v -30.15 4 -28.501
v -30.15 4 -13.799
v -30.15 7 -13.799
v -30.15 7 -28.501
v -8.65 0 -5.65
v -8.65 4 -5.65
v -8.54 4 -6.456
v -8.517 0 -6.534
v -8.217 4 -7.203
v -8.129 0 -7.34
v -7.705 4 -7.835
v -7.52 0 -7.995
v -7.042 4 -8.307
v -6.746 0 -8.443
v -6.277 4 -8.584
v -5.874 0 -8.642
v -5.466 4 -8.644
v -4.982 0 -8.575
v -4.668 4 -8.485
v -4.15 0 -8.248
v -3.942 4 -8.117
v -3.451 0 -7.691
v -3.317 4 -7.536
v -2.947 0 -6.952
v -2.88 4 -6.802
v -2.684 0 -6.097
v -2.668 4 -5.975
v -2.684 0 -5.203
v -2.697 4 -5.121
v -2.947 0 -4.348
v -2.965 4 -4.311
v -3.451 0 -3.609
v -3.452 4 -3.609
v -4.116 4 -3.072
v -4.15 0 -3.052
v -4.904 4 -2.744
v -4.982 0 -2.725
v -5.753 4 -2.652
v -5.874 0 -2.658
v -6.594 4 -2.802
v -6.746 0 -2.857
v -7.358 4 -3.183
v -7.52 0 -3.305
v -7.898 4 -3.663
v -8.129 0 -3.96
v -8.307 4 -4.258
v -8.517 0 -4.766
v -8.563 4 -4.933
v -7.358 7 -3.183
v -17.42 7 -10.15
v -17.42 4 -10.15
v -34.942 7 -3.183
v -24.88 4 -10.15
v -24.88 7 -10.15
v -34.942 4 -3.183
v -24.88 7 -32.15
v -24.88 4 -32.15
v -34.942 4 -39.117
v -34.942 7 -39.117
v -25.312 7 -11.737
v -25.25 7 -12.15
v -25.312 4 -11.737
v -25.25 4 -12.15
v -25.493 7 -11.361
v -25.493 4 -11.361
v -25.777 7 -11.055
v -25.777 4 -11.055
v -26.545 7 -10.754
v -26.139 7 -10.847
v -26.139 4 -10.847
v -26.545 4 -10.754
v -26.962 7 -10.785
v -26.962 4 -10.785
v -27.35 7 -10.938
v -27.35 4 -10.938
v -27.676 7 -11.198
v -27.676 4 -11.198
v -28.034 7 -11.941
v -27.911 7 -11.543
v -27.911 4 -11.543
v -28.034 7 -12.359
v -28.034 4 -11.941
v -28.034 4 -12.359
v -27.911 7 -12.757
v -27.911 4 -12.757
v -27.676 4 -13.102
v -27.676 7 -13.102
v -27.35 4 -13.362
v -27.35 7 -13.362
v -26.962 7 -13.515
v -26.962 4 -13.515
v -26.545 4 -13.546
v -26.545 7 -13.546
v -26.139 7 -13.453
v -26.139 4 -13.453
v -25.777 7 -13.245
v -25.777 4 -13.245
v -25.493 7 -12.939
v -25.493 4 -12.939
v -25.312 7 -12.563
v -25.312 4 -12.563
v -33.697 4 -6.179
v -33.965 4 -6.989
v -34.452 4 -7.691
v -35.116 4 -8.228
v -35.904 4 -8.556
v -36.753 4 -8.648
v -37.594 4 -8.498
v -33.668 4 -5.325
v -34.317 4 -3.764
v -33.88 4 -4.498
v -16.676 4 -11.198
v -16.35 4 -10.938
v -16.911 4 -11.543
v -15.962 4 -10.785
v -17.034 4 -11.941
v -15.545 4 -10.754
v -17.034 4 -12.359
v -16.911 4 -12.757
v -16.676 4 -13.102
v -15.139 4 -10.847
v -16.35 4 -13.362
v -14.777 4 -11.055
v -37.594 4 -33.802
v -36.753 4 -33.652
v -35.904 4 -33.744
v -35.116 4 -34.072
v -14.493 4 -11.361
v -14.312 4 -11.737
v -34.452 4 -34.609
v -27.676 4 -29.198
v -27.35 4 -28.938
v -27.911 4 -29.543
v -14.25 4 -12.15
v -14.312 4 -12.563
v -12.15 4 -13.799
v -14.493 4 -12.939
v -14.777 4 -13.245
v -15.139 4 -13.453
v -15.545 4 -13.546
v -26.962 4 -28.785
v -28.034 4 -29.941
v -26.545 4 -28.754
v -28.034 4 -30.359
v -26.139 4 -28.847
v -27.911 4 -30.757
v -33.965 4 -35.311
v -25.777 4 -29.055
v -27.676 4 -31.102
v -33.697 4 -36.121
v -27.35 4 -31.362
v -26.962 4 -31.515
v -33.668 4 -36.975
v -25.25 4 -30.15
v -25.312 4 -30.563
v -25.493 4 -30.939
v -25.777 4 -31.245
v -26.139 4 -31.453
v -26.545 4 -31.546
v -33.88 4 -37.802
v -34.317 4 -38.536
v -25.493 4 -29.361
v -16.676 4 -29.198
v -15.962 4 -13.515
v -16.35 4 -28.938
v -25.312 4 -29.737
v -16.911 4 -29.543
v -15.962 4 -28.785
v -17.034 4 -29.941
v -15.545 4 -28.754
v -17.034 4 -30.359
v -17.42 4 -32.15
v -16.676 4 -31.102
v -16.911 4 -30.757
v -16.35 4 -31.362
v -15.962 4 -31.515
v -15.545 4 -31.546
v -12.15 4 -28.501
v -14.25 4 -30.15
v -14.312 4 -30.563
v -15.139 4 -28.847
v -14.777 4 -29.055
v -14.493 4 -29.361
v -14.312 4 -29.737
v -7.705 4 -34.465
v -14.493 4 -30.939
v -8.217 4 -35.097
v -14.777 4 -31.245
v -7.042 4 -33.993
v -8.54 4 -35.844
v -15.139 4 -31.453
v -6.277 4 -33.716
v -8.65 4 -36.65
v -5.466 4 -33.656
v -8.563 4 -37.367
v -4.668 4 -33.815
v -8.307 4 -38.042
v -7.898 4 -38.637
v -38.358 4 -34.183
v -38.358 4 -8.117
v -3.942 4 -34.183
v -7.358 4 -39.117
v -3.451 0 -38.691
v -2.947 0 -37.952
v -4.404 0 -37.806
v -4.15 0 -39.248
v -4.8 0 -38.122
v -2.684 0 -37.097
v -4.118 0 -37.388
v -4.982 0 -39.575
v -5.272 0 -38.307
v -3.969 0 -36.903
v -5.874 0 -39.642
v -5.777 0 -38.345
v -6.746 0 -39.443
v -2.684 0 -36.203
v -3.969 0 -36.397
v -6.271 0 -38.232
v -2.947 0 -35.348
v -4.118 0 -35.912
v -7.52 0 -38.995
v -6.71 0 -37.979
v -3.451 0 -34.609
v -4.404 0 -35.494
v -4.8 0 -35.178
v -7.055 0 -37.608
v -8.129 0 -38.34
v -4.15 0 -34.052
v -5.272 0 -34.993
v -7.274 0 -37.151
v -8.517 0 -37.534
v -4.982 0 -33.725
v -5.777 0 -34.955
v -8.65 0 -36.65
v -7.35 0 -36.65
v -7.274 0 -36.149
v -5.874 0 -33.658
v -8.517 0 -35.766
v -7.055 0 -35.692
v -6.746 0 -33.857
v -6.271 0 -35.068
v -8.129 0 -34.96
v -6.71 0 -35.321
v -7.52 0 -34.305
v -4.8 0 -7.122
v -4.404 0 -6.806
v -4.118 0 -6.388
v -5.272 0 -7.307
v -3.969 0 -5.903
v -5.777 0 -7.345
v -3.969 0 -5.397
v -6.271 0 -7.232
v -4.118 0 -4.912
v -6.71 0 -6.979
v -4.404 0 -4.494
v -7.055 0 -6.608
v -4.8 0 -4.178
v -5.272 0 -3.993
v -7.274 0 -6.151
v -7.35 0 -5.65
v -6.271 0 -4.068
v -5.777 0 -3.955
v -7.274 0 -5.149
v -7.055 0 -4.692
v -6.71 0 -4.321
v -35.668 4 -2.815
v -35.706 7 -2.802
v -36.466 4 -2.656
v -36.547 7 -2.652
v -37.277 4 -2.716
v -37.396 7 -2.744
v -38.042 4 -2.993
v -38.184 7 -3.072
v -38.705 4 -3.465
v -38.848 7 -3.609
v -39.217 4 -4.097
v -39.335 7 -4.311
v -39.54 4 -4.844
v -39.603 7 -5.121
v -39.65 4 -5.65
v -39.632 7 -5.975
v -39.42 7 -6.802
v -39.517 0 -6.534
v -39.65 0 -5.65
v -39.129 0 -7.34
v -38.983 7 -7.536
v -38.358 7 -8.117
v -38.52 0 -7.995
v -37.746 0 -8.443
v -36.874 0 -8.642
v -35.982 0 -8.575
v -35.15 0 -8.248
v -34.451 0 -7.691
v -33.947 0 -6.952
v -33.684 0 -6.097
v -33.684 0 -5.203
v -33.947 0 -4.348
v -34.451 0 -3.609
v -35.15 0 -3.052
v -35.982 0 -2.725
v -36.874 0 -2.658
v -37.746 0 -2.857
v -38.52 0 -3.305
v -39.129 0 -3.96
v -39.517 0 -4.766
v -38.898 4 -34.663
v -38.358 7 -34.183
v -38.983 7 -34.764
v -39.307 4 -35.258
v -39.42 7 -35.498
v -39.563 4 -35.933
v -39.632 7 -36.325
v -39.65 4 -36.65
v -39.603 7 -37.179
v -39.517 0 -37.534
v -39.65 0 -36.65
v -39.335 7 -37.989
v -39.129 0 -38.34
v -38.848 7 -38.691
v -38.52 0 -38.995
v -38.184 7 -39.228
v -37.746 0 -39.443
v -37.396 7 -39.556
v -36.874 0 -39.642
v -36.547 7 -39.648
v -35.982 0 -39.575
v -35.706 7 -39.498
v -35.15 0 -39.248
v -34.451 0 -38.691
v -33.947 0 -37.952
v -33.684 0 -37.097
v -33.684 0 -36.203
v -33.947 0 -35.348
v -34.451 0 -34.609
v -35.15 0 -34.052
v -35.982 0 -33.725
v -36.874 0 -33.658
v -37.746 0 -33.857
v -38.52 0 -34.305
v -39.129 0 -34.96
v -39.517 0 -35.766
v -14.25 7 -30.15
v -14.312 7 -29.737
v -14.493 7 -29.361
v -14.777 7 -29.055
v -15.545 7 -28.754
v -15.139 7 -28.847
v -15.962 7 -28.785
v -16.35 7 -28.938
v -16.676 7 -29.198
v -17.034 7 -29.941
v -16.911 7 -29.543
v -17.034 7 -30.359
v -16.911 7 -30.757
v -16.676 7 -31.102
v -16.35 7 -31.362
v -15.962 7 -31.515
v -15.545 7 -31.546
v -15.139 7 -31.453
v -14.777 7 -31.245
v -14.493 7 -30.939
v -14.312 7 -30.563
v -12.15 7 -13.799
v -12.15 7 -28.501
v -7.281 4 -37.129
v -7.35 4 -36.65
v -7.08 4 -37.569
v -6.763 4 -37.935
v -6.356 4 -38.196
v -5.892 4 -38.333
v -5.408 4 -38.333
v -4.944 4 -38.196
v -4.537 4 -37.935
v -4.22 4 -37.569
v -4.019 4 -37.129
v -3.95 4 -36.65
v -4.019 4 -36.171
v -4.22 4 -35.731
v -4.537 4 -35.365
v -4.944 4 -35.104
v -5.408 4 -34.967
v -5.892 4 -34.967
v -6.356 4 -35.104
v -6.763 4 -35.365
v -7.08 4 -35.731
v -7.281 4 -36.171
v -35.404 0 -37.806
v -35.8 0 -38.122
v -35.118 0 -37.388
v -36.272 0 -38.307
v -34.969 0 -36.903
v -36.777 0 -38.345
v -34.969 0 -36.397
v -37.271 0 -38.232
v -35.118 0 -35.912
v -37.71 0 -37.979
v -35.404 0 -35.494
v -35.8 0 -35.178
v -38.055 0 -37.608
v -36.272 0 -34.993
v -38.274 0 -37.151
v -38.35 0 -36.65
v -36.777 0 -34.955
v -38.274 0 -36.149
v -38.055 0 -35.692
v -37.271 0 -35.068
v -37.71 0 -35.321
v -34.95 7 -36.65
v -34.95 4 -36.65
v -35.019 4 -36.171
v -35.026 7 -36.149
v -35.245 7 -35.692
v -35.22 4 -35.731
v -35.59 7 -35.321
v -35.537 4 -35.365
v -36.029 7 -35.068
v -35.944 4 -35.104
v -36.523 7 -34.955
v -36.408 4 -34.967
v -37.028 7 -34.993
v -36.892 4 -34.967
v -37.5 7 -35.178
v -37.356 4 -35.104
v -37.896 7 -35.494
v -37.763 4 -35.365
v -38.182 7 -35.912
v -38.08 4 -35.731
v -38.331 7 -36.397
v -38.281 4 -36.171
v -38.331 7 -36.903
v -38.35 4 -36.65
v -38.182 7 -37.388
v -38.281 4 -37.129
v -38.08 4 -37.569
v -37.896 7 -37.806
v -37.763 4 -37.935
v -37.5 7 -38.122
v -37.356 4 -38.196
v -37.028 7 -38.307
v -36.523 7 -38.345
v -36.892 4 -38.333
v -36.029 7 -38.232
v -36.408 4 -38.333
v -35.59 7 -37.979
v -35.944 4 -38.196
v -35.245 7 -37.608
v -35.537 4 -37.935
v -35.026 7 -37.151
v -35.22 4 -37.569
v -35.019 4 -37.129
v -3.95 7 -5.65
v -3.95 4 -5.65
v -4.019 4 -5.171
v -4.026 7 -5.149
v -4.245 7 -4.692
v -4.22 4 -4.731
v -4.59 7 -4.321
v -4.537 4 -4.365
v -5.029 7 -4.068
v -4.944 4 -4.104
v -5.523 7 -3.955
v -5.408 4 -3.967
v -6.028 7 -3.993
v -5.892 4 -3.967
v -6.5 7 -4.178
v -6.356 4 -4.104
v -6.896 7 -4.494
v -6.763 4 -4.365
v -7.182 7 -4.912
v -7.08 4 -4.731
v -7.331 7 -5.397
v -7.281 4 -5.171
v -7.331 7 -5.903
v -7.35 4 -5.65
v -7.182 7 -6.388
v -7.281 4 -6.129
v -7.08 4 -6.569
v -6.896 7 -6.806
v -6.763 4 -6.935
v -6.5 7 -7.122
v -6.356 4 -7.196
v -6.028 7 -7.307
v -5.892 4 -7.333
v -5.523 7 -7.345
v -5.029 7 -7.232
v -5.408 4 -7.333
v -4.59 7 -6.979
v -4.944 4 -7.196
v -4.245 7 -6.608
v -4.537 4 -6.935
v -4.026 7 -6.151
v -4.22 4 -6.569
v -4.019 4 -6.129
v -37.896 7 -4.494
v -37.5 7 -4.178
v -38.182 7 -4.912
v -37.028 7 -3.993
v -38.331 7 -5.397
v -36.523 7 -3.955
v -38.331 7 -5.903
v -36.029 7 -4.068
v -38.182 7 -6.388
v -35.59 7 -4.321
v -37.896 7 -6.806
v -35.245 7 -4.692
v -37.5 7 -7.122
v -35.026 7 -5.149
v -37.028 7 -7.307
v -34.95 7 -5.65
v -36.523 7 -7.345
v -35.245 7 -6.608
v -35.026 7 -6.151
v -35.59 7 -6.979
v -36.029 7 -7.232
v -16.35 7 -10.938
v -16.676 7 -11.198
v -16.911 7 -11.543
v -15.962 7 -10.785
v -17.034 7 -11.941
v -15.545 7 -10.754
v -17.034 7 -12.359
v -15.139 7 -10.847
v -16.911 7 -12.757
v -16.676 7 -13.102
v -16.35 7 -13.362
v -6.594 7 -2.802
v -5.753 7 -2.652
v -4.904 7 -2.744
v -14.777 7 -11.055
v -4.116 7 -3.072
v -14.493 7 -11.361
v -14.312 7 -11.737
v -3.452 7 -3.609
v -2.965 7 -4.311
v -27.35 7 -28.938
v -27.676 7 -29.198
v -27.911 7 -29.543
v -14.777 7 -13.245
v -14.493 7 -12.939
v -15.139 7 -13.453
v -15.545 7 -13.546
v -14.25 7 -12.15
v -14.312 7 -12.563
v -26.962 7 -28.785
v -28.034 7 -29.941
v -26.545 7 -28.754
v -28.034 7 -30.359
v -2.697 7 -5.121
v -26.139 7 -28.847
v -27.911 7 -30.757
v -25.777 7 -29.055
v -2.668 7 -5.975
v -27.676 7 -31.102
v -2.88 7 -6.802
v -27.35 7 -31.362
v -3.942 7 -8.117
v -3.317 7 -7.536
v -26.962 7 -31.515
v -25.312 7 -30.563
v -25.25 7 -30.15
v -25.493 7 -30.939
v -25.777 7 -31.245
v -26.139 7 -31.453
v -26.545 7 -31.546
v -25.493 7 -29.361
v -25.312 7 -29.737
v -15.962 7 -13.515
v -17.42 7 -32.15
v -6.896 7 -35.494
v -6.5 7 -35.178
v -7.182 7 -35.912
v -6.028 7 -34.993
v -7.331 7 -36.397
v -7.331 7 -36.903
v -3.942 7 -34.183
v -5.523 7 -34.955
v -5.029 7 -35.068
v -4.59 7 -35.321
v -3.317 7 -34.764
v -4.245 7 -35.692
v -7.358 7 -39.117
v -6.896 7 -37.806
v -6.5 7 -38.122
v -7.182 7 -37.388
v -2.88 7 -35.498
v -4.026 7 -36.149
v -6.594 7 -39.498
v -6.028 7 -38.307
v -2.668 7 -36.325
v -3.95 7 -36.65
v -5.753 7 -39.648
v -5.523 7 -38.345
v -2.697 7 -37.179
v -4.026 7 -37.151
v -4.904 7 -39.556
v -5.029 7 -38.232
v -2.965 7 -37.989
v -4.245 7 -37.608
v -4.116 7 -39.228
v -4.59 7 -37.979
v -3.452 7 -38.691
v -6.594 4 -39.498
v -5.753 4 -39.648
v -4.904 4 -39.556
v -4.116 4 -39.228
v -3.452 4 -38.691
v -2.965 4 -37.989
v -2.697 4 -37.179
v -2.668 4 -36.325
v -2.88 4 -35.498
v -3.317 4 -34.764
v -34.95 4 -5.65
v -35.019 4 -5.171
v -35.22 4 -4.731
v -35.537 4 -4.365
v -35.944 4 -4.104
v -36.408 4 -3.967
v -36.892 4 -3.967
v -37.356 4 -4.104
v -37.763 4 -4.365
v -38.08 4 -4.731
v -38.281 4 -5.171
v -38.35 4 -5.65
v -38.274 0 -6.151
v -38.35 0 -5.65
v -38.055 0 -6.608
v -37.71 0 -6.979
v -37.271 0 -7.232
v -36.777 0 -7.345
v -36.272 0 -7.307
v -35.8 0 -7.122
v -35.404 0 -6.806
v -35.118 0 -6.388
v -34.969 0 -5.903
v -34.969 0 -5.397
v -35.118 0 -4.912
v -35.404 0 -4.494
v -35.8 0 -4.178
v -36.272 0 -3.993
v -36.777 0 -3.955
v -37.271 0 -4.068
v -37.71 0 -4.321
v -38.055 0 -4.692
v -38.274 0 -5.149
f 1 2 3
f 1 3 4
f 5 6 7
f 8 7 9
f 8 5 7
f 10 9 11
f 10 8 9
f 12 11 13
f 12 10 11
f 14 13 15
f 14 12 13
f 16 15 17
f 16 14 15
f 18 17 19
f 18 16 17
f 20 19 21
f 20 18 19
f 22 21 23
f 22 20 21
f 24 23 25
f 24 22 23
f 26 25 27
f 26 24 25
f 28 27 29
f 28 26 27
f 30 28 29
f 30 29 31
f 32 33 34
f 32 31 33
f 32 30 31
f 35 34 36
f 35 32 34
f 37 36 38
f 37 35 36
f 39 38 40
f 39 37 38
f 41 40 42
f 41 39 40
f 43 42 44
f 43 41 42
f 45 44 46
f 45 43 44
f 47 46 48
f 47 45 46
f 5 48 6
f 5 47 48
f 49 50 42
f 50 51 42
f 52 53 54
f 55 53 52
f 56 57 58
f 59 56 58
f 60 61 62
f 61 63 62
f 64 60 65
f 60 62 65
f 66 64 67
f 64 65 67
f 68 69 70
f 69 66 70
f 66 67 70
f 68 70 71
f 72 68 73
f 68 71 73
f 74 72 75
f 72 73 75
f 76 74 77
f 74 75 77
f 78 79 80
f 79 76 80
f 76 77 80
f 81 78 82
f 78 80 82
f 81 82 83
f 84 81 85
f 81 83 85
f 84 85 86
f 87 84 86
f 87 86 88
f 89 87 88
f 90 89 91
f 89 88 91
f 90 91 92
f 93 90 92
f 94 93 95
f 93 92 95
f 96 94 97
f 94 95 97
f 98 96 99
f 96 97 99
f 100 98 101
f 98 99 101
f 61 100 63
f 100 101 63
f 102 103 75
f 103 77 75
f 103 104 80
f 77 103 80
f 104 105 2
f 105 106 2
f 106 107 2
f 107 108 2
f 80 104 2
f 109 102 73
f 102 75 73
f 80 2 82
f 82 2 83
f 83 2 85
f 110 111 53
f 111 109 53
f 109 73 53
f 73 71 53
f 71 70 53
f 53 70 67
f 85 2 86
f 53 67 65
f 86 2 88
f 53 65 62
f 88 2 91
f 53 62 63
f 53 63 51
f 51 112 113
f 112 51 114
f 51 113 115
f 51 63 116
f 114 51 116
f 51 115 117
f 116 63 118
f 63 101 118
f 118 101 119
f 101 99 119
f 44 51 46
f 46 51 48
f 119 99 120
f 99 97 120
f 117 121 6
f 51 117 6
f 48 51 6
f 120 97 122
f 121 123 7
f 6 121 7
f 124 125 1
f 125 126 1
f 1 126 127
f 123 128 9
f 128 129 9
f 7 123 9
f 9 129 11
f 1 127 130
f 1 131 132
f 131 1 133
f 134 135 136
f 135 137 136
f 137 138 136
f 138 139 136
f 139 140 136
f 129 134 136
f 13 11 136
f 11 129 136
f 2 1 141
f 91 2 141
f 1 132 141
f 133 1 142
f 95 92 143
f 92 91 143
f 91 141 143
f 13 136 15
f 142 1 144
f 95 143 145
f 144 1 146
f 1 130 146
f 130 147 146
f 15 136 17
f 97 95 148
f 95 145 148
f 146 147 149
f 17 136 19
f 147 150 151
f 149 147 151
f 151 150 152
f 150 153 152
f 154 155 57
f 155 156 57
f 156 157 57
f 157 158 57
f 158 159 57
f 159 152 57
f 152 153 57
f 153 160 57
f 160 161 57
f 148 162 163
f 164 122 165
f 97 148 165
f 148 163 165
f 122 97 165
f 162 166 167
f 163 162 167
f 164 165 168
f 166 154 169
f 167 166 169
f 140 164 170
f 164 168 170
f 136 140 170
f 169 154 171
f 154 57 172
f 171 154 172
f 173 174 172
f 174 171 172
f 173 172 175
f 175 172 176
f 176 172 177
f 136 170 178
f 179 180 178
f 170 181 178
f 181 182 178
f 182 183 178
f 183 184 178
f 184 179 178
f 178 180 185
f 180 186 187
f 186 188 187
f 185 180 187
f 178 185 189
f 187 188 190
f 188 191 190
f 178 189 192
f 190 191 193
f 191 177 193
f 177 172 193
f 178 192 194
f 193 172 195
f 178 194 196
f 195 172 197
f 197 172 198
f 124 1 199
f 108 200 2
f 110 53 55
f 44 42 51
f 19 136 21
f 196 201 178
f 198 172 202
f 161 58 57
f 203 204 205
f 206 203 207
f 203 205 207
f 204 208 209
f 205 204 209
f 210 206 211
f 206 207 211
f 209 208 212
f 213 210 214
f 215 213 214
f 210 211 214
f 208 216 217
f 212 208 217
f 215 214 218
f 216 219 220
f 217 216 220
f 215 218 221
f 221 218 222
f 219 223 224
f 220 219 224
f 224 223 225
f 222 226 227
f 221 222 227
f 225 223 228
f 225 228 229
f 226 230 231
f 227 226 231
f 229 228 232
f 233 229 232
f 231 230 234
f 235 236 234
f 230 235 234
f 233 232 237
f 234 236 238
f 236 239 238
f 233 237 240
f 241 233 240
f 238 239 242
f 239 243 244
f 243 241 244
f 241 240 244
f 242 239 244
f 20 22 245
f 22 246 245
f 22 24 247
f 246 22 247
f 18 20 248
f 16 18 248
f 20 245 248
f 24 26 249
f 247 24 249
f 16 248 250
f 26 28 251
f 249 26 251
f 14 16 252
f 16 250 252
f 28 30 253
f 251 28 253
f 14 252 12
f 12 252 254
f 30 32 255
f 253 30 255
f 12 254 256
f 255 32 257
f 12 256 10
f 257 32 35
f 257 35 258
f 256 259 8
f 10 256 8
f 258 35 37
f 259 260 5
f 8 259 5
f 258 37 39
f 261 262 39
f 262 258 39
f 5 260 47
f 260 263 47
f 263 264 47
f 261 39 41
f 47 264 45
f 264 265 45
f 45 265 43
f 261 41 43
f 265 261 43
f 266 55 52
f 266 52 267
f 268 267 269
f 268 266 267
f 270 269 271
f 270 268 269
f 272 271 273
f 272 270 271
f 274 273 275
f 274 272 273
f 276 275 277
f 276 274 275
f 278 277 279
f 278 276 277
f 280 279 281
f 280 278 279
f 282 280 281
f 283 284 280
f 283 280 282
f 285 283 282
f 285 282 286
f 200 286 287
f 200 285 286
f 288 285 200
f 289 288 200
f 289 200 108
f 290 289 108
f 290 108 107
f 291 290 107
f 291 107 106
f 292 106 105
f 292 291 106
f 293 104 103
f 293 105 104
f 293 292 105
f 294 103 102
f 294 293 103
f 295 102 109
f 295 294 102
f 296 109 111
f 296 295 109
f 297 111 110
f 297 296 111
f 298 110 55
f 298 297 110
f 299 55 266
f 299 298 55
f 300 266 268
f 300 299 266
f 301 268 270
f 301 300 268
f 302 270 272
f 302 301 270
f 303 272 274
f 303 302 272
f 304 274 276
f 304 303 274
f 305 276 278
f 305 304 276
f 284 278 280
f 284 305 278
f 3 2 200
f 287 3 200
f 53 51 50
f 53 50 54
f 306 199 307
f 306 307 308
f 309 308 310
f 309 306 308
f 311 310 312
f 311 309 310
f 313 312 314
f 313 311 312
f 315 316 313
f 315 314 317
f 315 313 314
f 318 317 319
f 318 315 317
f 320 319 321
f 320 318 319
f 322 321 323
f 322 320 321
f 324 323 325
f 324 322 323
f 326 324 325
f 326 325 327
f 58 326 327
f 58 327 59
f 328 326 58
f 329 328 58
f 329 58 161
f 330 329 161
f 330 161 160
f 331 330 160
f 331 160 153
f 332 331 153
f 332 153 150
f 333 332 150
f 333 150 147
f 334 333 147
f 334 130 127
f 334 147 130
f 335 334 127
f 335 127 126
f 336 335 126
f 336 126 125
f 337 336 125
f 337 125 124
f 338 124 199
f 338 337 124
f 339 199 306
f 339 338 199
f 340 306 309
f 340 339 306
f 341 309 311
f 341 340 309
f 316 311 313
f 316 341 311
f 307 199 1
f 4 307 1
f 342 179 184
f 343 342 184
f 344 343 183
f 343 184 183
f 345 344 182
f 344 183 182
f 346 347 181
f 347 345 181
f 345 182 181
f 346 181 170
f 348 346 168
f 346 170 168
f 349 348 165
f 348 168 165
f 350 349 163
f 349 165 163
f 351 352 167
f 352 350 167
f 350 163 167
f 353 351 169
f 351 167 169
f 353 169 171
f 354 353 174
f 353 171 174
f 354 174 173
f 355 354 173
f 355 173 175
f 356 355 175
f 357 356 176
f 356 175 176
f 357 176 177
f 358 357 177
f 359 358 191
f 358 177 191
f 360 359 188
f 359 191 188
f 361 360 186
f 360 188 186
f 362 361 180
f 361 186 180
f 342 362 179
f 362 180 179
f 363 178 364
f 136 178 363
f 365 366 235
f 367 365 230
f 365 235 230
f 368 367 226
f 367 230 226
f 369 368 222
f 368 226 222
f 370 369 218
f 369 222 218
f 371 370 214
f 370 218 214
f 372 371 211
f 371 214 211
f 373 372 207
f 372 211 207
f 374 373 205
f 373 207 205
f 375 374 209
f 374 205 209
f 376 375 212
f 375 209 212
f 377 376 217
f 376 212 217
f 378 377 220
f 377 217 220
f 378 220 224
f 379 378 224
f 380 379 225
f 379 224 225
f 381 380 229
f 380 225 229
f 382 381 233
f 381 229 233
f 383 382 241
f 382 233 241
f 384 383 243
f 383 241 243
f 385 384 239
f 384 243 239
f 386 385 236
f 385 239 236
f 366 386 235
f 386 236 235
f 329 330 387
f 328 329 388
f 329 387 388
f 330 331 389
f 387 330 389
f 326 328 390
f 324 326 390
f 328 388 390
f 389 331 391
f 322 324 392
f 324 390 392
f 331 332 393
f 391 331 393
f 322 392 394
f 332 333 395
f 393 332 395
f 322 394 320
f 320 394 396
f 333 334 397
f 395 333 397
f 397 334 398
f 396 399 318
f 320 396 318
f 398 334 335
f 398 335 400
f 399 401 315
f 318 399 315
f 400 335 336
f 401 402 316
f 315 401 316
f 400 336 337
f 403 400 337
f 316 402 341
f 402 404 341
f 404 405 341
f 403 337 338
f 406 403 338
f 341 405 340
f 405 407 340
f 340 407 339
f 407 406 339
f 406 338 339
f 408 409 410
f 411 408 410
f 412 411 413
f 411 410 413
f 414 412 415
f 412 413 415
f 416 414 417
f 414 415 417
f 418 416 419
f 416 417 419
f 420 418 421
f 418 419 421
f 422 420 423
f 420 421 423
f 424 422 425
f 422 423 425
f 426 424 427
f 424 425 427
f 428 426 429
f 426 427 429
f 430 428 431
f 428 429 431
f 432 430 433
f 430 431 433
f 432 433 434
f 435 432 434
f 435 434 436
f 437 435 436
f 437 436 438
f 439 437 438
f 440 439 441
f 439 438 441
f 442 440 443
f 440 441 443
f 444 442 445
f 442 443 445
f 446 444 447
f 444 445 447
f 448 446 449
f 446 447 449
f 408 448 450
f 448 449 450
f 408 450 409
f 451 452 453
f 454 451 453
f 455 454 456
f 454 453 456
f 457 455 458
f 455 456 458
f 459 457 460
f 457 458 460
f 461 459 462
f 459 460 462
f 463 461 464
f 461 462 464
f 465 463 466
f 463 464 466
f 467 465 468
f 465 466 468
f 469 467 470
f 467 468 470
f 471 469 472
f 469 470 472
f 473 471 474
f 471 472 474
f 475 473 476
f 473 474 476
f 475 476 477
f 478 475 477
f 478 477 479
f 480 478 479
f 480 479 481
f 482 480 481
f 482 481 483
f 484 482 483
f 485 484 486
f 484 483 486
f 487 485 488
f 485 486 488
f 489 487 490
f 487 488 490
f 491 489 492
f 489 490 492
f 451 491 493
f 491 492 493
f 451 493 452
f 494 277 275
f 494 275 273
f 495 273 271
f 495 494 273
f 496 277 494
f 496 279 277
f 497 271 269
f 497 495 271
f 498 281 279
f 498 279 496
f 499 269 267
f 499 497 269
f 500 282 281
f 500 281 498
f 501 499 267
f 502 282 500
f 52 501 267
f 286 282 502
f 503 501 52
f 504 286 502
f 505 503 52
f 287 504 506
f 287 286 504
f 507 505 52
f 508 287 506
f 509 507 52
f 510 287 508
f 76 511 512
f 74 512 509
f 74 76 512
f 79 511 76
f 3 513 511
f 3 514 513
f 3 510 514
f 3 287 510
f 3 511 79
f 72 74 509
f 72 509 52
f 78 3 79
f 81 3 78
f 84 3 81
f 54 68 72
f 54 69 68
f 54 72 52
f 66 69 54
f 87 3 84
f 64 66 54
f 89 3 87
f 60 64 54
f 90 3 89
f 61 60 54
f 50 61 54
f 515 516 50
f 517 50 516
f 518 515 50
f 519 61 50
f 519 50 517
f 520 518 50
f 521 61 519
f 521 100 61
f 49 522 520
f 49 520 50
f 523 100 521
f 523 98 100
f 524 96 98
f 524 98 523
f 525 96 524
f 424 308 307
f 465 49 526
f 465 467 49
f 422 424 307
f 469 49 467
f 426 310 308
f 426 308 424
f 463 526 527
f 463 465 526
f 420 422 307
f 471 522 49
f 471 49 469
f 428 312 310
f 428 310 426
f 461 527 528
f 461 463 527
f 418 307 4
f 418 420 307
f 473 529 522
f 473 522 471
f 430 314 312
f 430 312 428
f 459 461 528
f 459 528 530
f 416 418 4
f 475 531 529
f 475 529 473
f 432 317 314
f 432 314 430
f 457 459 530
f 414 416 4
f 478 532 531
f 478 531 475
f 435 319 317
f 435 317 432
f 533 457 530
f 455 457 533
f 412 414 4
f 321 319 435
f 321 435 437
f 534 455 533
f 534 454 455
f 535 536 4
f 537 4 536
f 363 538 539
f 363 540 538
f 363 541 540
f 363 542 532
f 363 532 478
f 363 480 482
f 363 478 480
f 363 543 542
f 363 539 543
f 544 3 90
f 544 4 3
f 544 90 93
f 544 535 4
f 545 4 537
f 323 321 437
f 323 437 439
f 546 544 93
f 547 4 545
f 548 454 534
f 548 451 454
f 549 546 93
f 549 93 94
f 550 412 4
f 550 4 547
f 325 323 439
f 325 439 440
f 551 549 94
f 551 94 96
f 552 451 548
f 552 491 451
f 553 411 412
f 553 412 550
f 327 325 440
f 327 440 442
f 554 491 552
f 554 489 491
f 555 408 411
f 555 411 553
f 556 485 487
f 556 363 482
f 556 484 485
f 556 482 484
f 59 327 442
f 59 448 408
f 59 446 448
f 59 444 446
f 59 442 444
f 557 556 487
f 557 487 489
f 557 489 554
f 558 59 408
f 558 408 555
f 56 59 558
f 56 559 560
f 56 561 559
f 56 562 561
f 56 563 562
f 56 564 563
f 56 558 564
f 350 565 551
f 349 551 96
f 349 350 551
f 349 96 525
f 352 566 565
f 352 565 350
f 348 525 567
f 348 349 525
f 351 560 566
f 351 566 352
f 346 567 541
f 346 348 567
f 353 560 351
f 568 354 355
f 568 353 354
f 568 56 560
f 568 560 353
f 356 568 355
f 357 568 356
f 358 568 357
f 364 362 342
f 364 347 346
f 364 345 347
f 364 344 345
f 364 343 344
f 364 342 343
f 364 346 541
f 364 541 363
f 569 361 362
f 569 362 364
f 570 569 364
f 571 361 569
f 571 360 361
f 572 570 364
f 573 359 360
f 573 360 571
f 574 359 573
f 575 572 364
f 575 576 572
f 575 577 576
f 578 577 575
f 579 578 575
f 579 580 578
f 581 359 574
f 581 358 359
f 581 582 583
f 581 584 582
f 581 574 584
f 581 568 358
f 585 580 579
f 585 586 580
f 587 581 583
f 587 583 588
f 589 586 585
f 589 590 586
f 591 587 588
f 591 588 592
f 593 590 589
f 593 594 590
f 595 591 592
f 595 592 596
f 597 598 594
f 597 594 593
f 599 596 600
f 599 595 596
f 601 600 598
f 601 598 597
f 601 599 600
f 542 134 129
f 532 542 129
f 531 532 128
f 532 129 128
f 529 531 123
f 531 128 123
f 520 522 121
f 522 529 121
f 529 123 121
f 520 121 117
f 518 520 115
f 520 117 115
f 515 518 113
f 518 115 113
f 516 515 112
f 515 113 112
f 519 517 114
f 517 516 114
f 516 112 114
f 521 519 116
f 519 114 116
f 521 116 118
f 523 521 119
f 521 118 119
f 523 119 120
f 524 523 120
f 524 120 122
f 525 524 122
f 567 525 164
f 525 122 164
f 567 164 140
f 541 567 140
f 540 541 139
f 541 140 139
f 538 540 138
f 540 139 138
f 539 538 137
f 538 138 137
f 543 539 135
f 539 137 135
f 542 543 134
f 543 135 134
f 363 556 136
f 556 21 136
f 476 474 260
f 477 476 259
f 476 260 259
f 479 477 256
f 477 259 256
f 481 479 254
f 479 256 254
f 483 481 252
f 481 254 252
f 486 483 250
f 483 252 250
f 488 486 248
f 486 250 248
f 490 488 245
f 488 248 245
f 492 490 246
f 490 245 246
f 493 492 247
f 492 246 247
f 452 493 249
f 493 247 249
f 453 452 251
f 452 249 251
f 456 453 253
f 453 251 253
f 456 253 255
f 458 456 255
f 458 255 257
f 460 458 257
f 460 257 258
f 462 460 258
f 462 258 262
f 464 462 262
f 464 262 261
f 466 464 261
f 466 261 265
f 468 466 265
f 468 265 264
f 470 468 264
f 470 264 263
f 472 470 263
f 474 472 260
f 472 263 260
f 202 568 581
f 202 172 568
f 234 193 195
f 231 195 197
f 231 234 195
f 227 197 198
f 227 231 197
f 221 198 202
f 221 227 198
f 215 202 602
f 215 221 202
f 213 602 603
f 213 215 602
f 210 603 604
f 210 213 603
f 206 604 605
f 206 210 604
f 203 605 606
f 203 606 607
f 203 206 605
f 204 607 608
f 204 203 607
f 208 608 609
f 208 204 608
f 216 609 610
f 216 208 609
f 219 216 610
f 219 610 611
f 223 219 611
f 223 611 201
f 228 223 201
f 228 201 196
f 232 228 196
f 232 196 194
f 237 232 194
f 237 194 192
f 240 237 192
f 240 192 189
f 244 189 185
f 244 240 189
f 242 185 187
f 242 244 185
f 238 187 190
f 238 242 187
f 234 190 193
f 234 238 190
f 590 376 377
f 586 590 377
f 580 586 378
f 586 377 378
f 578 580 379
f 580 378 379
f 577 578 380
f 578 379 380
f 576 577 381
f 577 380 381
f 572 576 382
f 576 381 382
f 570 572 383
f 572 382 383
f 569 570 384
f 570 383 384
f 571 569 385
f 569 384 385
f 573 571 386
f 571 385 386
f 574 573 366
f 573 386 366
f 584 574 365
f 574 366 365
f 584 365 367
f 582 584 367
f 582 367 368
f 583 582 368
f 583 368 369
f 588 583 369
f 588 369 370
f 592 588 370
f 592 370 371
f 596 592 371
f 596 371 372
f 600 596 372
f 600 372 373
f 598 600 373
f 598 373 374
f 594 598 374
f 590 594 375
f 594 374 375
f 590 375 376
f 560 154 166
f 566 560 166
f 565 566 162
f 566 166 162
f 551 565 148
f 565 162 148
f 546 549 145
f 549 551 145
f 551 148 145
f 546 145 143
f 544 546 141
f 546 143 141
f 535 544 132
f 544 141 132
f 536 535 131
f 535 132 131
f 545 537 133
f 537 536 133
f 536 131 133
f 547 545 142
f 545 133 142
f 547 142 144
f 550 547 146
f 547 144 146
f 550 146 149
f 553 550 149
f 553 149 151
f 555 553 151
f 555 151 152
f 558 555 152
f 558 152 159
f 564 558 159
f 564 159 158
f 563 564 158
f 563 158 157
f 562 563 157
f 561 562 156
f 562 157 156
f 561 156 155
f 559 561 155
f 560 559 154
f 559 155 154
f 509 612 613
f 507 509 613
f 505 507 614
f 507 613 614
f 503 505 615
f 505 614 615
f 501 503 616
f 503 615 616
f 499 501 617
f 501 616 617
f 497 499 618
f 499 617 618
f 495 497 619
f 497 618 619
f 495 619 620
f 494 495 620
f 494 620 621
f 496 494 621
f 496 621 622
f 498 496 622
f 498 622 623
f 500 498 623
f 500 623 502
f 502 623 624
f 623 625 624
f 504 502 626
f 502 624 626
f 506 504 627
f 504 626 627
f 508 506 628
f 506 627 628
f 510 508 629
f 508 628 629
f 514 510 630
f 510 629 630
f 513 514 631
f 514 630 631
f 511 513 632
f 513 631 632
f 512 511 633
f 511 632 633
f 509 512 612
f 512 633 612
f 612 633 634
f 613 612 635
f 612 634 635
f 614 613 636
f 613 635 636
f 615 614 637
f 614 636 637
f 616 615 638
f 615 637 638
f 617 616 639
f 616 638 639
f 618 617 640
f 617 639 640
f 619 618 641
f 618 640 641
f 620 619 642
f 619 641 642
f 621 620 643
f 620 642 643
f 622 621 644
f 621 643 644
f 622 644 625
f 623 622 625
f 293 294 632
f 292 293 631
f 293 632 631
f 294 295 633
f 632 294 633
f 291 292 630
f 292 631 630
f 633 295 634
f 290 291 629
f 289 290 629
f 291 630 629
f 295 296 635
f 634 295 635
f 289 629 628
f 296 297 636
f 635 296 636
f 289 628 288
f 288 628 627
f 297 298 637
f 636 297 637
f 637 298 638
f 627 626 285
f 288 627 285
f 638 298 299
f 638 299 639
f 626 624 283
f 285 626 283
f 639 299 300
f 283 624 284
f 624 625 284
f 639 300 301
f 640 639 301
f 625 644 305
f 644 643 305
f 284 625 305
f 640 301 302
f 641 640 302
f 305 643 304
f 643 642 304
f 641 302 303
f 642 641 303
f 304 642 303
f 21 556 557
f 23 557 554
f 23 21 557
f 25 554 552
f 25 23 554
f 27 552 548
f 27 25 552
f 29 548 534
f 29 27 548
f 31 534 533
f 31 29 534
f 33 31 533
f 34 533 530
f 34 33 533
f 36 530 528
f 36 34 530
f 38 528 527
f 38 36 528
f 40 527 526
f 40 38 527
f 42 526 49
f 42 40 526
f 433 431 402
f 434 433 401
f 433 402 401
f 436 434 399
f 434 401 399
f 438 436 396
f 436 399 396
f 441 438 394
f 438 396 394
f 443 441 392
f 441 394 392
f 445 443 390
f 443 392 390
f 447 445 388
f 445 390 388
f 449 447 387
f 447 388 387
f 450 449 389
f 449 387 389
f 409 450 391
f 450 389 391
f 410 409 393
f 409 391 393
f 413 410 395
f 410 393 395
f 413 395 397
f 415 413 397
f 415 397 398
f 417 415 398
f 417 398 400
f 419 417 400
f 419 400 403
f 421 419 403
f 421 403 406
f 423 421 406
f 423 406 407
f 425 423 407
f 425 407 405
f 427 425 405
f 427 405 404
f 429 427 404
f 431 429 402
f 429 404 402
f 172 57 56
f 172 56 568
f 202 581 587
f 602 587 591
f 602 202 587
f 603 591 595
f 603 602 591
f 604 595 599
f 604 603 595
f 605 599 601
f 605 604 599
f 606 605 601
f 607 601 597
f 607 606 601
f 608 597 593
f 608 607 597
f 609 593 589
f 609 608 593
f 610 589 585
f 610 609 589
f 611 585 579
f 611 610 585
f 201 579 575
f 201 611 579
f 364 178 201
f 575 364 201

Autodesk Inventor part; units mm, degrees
ref_plane "YZ Plane" through (0, 0, 0) normal (1, 0, 0) x (0, 1, 0)
ref_plane "XZ Plane" through (0, 0, 0) normal (0, 1, 0) x (-1, 0, 0)
ref_plane "XY Plane" through (0, 0, 0) normal (0, 0, 1) x (1, 0, 0)
sketch "Sketch1" plane through (0, 0, 0) normal (0, 1, 0) x (-1, 0, 0)
  line L0 (0, 0) -> (42.3, 0) construction
  line L1 (42.3, 0) -> (42.3, -42.3) construction
  line L2 (42.3, -42.3) -> (0, -42.3) construction
  line L3 (0, -42.3) -> (0, 0) construction
  circle A0 centre (36.65, -5.65) radius 1.7
  circle A1 centre (36.65, -36.65) radius 1.7
  circle A2 centre (5.65, -5.65) radius 1.7
  circle A3 centre (5.65, -36.65) radius 1.7
  line L4 (5.65, -5.65) -> (5.65, -36.65) construction
  line L5 (5.65, -36.65) -> (36.65, -36.65) construction
  line L6 (36.65, -36.65) -> (36.65, -5.65) construction
  line L7 (36.65, -5.65) -> (5.65, -5.65) construction
  circle A4 centre (36.65, -5.65) radius 3
  circle A5 centre (36.65, -36.65) radius 3
  circle A6 centre (5.65, -36.65) radius 3
  circle A7 centre (5.65, -5.65) radius 3
  dimension "d0" = 42.3
  dimension "d1" = 42.3
  dimension "d2" = 3.4
  dimension "d3" = 3.4
  dimension "d4" = 31
  dimension "d5" = 3.4
  dimension "d6" = 3.4
  dimension "d8" = 31
  dimension "d9" = 5.65
  dimension "d10" = 5.65
  dimension "d11" = 31
  dimension "d12" = 6
  dimension "d13" = 6
  dimension "d14" = 6
  dimension "d15" = 6
extrude "Extrusion1" add sketch "Sketch1" along normal blind 4
sketch "Sketch2" plane through (-36.65, 4, -5.65) normal (0, 1, 0) x (1, 0, 0)
  line L0 (-5.65, -5.65) -> (-5.65, 36.65) construction
  line L1 (36.65, -5.65) -> (-5.65, -5.65) construction
  line L2 (-5.65, 36.65) -> (36.65, 36.65) construction
  line L3 (36.65, 36.65) -> (36.65, -5.65) construction
  line L4 (-5.65, -5.65) -> (36.65, 36.65) construction
  line L5 (-5.65, 36.65) -> (36.65, -5.65) construction
  line L6 (24.5, 4.5) -> (6.5, 4.5)
  line L7 (6.5, 4.5) -> (6.5, 26.5)
  line L8 (6.5, 26.5) -> (24.5, 26.5)
  line L9 (24.5, 26.5) -> (24.5, 4.5)
  line L10 (24.5, 4.5) -> (6.5, 26.5) construction
  line L11 (6.5, 4.5) -> (24.5, 26.5) construction
  circle A0 centre (10, 6.5) radius 1.4
  circle A1 centre (10, 24.5) radius 1.4
  circle A2 centre (21, 24.5) radius 1.4
  circle A3 centre (21, 6.5) radius 1.4
  line L12 (10, 24.5) -> (21, 24.5) construction
  line L13 (21, 24.5) -> (21, 6.5) construction
  line L14 (21, 6.5) -> (10, 6.5) construction
  line L15 (10, 6.5) -> (10, 24.5) construction
  line L16 (21, 6.5) -> (21, 4.5) construction
  line L17 (21, 24.5) -> (21, 26.5) construction
  line L18 (10, 6.5) -> (6.5, 6.5) construction
  line L19 (21, 6.5) -> (24.5, 6.5) construction
  circle A4 centre (0, 0) radius 3 projected
  circle A5 centre (0, 31) radius 3 projected
  circle A6 centre (31, 31) radius 3 projected
  circle A7 centre (31, 0) radius 3 projected
  line L20 (11.7705, 4.5) -> (1.7076, -2.4666)
  circle A8 centre (0, 0) radius 3 construction
  line L21 (6.5, 8.1488) -> (-1.7076, 2.4666)
  circle A9 centre (0, 31) radius 3 projected
  line L22 (-1.7076, 28.5334) -> (6.5, 22.8512)
  line L23 (11.7705, 26.5) -> (1.7076, 33.4666)
  line L24 (6.5, 26.5) -> (0, 31) construction
  line L25 (6.5, 4.5) -> (0, 0) construction
  line L26 (24.5, 4.5) -> (31, 0) construction
  line L27 (19.2295, 4.5) -> (29.2924, -2.4666)
  circle A10 centre (31, 0) radius 3 projected
  line L28 (32.7076, 2.4666) -> (24.5, 8.1488)
  line L29 (24.5, 26.5) -> (31, 31) construction
  line L30 (19.2295, 26.5) -> (29.2924, 33.4666)
  line L31 (24.5, 22.8512) -> (32.7076, 28.5334)
  circle A11 centre (31, 31) radius 3 projected
  arc A12 (1.7076, 33.4666) -> (-1.7076, 28.5334) centre (0, 31) ccw
  arc A13 (32.7076, 28.5334) -> (29.2924, 33.4666) centre (31, 31) ccw
  arc A14 (29.2924, -2.4666) -> (32.7076, 2.4666) centre (31, 0) ccw
  arc A15 (-1.7076, 2.4666) -> (1.7076, -2.4666) centre (0, 0) ccw
  circle A16 centre (0, 0) radius 1.7 projected
  circle A17 centre (0, 31) radius 1.7 projected
  circle A18 centre (31, 31) radius 1.7 projected
  circle A19 centre (31, 0) radius 1.7 projected
  circle A20 centre (31, 0) radius 1.7
  circle A21 centre (31, 31) radius 1.7
  circle A22 centre (0, 0) radius 1.7
  circle A23 centre (0, 31) radius 1.7
  point P0 (15.5, 15.5)
  dimension "d18" = 18
  dimension "d19" = 22
  dimension "d20" = 2.8
  dimension "d21" = 2.8
  dimension "d22" = 2.8
  dimension "d23" = 2.8
  dimension "d24" = 11
  dimension "d25" = 18
extrude "Extrusion2" add sketch "Sketch2" along normal blind 3
properties part number "AdapterBoardNema17Mount"
